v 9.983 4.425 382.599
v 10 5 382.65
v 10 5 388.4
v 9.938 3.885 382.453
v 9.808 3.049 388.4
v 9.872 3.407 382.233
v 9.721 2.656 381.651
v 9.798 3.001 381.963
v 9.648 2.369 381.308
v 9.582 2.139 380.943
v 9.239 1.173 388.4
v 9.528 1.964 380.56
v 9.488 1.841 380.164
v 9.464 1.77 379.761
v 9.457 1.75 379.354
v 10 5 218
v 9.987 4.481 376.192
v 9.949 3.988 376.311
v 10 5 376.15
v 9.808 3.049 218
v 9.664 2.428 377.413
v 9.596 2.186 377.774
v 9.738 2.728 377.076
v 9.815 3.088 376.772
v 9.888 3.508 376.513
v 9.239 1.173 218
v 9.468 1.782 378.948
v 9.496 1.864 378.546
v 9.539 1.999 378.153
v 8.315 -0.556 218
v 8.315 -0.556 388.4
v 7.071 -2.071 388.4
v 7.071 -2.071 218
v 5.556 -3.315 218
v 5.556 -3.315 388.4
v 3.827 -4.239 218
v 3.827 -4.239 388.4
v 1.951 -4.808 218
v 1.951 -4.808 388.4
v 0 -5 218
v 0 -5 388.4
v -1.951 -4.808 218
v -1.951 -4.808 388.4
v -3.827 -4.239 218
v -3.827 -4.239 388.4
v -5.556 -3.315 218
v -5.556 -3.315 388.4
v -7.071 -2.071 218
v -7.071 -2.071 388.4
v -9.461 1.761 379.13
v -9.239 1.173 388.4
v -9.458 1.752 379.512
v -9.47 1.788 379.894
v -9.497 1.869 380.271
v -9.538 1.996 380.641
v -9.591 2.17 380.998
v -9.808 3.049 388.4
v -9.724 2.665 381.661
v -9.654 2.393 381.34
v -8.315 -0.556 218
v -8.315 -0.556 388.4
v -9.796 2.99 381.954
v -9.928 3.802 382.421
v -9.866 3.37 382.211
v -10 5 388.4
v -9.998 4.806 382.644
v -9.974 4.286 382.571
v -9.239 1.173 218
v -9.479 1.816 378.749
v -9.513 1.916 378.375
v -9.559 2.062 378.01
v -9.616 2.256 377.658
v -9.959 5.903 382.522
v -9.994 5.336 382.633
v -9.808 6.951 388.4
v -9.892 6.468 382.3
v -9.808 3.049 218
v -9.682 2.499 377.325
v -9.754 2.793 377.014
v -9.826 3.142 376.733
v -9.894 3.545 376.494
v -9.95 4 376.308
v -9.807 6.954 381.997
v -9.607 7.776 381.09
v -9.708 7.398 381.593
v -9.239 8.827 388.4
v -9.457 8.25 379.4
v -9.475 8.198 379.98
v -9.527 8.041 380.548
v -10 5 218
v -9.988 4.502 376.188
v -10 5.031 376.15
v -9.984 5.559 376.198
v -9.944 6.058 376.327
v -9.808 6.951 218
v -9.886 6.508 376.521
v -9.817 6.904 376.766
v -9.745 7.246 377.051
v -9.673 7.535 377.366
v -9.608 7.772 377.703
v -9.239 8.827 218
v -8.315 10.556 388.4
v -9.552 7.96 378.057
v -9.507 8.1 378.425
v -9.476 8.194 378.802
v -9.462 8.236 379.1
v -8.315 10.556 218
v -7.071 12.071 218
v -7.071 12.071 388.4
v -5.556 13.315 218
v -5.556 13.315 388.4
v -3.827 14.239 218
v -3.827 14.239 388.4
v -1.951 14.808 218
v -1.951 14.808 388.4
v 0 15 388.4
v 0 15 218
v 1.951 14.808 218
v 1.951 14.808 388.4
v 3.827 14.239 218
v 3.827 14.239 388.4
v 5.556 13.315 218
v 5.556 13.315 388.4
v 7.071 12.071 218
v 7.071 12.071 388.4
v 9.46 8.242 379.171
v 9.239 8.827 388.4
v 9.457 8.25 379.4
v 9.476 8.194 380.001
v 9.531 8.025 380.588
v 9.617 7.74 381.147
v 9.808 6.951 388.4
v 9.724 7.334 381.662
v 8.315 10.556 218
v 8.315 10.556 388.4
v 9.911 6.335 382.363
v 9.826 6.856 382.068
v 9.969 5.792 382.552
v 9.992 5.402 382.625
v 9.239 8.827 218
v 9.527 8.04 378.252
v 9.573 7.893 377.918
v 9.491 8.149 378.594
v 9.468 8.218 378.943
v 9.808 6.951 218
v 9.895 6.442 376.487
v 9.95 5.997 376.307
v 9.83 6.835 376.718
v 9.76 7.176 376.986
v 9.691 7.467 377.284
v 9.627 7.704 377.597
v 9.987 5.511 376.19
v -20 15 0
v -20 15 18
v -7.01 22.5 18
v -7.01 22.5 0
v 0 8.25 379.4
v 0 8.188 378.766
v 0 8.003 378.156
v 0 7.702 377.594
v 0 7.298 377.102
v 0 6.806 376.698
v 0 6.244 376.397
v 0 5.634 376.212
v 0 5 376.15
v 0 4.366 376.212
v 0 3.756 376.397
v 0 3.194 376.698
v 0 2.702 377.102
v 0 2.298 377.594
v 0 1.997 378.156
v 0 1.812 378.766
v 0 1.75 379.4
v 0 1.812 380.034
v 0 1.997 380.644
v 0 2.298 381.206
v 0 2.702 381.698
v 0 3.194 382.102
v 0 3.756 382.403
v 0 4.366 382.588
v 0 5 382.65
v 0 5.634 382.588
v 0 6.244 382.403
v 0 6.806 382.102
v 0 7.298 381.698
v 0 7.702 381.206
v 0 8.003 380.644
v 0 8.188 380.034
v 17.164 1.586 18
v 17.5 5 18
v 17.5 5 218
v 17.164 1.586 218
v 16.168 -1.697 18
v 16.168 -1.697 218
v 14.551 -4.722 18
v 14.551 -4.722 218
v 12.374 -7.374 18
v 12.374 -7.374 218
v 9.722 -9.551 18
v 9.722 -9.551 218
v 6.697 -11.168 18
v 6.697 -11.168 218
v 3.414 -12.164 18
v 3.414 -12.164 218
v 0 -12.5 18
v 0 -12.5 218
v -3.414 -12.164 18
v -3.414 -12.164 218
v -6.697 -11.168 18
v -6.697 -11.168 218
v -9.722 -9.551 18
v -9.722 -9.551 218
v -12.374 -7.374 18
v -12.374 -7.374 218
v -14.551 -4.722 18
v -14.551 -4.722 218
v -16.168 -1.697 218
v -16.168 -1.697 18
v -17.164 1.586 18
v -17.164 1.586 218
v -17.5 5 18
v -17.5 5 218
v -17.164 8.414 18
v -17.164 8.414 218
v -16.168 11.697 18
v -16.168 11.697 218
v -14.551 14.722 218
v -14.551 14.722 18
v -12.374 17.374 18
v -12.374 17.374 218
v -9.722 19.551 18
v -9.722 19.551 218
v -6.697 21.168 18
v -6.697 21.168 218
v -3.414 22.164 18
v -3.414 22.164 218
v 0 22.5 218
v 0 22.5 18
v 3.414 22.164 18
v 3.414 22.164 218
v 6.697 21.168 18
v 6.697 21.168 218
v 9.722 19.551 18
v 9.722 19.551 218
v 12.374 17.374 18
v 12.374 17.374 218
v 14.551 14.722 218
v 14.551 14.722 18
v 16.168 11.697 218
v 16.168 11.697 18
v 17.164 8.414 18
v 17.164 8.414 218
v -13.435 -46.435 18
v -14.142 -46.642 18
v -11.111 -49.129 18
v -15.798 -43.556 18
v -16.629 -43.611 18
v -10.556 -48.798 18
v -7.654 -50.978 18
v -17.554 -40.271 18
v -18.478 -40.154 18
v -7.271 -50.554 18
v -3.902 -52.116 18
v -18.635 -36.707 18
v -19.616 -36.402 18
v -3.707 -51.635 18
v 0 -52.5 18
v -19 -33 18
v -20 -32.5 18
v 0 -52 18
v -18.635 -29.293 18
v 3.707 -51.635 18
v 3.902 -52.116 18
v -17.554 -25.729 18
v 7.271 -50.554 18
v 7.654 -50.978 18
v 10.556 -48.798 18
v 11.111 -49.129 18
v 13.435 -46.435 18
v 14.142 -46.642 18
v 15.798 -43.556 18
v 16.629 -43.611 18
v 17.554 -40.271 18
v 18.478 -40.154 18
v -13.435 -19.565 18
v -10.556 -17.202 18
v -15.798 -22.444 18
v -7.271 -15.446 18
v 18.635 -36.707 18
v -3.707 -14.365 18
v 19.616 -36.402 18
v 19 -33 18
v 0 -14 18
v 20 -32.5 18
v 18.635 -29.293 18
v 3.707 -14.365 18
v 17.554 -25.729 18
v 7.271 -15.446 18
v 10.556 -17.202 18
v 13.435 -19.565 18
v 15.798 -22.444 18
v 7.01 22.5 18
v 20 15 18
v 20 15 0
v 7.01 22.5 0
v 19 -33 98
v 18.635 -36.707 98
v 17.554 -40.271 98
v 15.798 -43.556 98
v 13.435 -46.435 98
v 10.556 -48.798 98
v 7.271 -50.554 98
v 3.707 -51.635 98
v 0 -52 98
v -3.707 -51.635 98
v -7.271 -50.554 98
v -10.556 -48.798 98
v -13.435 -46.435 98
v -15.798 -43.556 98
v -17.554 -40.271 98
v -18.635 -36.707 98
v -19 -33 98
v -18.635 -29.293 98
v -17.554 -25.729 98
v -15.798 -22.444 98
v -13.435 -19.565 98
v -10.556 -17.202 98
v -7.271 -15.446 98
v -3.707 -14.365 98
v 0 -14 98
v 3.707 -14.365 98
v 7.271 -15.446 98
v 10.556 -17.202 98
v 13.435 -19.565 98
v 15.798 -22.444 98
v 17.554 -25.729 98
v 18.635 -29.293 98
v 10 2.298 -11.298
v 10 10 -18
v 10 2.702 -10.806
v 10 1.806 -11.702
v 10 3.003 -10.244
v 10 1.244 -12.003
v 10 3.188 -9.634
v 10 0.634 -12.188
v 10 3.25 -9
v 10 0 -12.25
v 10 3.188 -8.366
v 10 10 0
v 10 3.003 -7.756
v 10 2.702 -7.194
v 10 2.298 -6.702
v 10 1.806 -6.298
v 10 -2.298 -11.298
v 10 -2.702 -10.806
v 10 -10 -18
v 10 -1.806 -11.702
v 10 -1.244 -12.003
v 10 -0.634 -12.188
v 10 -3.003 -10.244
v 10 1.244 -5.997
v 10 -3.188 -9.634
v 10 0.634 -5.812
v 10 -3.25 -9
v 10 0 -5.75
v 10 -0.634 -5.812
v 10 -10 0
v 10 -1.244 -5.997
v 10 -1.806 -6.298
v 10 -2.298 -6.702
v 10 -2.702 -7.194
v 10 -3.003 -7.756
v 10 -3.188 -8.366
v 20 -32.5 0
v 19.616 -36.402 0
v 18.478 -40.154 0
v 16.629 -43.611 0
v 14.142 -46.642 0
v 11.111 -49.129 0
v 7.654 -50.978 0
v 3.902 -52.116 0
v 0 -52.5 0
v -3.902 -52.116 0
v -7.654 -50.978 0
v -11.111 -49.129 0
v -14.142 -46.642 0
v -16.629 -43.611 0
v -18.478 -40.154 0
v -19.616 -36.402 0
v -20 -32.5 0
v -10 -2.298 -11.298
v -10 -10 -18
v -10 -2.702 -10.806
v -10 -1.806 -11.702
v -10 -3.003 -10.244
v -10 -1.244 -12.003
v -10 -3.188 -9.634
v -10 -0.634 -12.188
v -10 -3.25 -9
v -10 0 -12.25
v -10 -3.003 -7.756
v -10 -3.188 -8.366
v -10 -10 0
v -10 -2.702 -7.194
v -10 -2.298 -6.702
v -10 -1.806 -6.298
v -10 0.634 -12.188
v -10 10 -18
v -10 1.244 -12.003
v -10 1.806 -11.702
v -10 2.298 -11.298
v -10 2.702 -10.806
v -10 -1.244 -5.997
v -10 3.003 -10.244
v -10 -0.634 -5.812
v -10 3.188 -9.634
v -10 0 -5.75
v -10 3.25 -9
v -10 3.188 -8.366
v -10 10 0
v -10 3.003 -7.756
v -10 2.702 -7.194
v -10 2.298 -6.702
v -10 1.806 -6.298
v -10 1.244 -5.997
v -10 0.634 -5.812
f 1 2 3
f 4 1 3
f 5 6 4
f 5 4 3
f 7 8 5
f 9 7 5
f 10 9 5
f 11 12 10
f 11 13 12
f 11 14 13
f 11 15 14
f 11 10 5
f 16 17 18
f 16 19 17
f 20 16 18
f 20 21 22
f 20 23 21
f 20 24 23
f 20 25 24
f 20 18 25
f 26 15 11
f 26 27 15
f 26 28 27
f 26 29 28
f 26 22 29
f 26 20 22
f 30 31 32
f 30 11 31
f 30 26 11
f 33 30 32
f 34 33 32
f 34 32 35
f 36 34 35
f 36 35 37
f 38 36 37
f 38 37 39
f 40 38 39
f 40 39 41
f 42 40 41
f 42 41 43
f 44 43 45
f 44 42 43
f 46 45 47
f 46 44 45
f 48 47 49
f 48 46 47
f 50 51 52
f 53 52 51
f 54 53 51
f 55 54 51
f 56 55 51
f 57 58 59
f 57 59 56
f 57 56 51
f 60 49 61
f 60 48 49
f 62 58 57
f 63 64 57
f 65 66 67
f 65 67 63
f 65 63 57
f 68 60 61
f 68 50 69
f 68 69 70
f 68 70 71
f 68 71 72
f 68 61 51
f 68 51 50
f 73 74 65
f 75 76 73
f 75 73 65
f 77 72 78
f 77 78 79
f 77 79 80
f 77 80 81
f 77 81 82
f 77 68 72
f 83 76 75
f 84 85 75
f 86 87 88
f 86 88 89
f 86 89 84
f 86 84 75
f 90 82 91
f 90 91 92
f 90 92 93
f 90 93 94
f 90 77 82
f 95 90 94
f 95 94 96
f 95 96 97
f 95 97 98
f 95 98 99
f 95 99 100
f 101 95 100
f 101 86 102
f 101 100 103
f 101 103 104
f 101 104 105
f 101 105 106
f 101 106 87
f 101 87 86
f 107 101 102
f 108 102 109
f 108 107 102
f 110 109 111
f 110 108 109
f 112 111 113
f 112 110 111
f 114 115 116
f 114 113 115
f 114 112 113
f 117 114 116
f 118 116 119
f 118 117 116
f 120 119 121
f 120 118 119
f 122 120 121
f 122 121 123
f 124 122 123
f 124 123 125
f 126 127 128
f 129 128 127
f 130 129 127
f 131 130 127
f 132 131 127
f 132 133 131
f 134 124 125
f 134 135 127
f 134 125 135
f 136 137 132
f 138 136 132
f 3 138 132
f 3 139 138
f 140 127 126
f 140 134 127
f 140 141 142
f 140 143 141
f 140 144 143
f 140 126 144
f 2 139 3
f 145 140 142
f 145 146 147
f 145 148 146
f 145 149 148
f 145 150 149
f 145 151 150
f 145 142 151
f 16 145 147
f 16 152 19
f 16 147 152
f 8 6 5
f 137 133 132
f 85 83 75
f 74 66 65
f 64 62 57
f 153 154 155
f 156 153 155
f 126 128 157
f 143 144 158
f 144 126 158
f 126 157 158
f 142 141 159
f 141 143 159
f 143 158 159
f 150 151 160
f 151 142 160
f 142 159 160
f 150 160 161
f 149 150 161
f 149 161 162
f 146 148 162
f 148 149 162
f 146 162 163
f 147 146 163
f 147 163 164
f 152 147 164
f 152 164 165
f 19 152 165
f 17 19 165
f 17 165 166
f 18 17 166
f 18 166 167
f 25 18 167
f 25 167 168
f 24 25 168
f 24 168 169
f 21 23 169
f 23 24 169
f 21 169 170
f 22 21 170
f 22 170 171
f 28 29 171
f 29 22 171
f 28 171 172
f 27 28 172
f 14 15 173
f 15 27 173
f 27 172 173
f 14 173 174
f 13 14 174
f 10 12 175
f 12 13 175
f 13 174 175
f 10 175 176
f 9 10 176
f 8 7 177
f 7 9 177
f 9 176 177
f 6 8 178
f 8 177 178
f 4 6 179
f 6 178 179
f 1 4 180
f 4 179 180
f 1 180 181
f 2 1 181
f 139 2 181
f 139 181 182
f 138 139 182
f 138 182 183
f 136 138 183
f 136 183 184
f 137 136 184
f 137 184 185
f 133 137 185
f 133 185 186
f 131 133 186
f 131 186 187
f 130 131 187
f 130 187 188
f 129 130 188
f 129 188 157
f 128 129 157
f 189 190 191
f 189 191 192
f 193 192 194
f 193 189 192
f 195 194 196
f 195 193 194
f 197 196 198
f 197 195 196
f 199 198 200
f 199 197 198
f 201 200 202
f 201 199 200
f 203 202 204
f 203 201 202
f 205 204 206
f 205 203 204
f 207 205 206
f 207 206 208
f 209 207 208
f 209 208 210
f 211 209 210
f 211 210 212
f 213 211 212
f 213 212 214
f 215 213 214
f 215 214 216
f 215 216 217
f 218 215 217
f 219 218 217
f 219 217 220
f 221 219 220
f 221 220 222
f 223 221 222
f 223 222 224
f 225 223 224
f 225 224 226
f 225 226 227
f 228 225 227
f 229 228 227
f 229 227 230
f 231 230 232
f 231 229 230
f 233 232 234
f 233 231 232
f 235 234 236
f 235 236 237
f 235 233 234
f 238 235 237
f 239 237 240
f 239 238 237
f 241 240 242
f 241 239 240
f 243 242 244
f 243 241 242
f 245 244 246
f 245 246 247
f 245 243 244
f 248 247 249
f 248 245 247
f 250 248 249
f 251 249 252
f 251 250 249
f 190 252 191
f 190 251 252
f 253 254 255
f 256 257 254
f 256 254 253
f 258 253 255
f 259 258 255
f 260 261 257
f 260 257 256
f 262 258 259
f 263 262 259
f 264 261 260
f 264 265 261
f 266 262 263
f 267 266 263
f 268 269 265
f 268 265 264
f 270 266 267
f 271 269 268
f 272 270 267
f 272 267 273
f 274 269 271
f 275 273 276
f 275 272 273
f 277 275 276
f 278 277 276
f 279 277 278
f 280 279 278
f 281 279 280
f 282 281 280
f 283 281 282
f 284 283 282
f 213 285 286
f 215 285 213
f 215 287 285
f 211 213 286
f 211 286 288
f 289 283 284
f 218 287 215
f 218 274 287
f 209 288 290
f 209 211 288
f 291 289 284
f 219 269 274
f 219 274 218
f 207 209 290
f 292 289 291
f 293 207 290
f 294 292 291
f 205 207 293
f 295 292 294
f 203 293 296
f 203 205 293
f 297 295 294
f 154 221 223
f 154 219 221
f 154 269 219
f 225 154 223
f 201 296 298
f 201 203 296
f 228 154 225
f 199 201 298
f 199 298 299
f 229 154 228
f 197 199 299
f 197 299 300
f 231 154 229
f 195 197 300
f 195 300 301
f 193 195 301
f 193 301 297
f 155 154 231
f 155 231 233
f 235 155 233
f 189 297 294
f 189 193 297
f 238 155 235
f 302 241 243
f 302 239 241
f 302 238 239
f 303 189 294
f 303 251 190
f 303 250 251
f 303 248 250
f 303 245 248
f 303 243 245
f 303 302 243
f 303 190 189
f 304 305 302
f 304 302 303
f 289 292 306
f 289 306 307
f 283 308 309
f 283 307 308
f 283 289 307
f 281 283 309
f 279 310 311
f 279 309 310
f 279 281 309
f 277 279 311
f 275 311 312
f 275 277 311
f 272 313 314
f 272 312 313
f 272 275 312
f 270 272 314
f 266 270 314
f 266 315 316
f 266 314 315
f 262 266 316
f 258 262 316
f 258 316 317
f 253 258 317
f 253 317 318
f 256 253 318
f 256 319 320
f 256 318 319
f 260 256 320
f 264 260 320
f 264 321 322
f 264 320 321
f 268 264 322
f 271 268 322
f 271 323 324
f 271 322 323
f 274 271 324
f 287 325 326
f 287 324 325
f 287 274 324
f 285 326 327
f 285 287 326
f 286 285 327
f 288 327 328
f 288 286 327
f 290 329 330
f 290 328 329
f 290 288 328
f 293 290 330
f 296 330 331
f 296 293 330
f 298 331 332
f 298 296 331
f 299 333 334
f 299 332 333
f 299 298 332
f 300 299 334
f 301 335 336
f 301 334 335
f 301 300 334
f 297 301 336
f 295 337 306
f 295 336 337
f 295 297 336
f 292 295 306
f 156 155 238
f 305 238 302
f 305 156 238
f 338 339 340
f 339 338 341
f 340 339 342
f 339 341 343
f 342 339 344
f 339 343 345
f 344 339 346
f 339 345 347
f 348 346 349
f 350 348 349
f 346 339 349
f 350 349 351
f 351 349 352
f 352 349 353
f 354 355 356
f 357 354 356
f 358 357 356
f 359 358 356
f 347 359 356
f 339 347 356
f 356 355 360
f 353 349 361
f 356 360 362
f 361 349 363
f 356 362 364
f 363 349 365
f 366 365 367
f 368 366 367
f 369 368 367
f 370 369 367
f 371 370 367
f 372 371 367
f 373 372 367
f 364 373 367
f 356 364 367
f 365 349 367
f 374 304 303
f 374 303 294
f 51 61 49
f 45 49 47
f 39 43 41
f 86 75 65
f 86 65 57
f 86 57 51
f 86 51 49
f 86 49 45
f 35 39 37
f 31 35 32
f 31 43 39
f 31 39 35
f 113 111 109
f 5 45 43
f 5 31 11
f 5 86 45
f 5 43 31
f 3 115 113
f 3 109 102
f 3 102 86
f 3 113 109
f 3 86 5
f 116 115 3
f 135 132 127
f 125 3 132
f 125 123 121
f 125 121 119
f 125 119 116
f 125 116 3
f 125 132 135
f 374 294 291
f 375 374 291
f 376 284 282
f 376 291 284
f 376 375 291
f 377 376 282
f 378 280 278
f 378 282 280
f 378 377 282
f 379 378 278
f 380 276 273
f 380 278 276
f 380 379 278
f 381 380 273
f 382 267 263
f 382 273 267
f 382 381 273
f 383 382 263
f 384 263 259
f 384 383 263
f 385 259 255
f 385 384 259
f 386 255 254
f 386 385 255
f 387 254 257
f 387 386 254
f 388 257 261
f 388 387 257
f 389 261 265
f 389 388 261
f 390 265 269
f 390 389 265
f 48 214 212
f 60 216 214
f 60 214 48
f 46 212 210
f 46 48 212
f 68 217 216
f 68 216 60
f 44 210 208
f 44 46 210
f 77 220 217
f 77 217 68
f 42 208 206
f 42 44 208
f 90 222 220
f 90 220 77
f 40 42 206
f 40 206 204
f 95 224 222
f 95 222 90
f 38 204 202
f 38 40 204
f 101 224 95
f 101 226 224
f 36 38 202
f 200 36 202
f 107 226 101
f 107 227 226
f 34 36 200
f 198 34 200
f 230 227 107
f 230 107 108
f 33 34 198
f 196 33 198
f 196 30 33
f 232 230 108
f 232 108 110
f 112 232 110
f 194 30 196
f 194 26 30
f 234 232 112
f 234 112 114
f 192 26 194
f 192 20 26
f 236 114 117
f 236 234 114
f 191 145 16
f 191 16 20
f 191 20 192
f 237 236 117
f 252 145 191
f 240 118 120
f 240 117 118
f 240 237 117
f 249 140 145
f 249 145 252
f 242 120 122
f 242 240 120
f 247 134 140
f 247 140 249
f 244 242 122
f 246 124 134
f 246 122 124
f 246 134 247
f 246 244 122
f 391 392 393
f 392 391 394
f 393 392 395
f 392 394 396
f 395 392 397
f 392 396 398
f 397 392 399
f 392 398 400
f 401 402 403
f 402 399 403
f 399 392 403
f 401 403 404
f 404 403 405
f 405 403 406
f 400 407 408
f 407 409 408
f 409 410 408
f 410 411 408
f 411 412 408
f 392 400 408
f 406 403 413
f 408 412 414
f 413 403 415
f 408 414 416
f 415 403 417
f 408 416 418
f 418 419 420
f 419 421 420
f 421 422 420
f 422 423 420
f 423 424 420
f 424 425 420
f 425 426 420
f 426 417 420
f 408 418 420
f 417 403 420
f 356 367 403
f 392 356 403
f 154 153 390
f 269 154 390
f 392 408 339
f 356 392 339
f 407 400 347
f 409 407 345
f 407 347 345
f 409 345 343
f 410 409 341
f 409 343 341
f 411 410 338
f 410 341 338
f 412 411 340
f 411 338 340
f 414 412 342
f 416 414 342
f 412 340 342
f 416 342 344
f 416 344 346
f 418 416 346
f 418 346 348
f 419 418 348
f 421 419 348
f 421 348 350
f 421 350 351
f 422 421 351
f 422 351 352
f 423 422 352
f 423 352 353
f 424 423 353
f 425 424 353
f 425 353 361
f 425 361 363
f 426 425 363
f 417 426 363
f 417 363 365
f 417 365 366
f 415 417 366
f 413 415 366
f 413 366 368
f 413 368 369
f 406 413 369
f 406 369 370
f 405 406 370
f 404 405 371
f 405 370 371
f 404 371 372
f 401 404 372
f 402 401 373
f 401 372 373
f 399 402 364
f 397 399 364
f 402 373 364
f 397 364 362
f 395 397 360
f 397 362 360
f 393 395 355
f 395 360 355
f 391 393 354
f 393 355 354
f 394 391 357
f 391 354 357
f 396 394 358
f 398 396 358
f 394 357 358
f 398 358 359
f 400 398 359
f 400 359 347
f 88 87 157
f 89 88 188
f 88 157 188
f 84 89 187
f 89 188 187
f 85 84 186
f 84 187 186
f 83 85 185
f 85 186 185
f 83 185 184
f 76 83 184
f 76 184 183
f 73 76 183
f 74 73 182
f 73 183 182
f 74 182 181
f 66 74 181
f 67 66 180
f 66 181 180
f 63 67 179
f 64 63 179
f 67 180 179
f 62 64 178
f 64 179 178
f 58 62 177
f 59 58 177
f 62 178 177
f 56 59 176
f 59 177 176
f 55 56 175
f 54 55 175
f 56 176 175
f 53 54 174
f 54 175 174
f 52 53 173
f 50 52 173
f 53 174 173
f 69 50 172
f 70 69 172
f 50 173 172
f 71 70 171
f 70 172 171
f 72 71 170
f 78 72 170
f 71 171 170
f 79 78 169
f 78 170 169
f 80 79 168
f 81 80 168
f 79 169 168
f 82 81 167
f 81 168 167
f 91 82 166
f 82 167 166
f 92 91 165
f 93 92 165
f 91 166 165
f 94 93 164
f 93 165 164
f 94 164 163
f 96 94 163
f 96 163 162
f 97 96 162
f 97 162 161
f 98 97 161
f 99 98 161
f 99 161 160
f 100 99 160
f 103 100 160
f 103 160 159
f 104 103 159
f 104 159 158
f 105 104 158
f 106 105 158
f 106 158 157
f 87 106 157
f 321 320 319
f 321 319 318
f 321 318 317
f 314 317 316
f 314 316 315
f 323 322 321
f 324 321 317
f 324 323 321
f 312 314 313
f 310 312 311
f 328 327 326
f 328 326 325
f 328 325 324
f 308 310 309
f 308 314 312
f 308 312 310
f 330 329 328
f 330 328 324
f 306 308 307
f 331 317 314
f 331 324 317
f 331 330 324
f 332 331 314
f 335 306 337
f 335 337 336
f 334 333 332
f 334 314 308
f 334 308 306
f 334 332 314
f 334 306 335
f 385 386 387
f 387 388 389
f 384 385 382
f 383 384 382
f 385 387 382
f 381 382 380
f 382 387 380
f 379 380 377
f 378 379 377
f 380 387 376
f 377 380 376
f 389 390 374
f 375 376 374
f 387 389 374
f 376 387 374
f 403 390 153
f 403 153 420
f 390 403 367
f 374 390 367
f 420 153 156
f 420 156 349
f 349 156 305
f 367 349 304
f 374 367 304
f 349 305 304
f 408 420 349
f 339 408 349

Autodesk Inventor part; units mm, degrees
ref_plane "YZ Plane" through (0, 0, 0) normal (1, 0, 0) x (0, 1, 0)
ref_plane "XZ Plane" through (0, 0, 0) normal (0, 1, 0) x (-1, 0, 0)
ref_plane "XY Plane" through (0, 0, 0) normal (0, 0, 1) x (1, 0, 0)
sketch "Sketch1" plane through (0, 0, 0) normal (0, 0, 1) x (1, 0, 0)
  line L0 (-10, -10) -> (10, -10)
  line L1 (10, -10) -> (10, 10)
  line L2 (10, 10) -> (-10, 10)
  line L3 (-10, 10) -> (-10, -10)
  line L4 (-10, -10) -> (10, 10) construction
  line L5 (10, -10) -> (-10, 10) construction
  line L6 (-20, 15) -> (-20, -32.5)
  line L7 (-20, 15) -> (-7.0096, 22.5)
  line L8 (-20, 15) -> (-5, 15) construction
  line L9 (-7.0096, 22.5) -> (7.0096, 22.5)
  line L10 (7.0096, 22.5) -> (20, 15)
  line L11 (20, 15) -> (20, -32.5)
  circle A0 centre (0, -32.5) radius 20 construction
  arc A1 (-20, -32.5) -> (20, -32.5) centre (0, -32.5) ccw
  point P0 (0, 0)
  point P1 (0, 22.5)
  point P2 (0, 10)
  dimension "d0" = 20
  dimension "d1" = 20
  dimension "d3" = 15
  dimension "d4" = 30
  dimension "d5" = 15
  dimension "d6" = 150
  dimension "d8" = 40
  dimension "d9" = 5
  dimension "d10" = 40
  dimension "d11" = 55
extrude "Extrusion1" add sketch "Sketch1" along normal blind 18
sketch "Sketch2" plane through (0, 0, 18) normal (0, 0, 1) x (1, 0, 0)
  line L0 (-10, -10) -> (-10, 10) projected
  line L1 (-10, 10) -> (10, 10) projected
  line L2 (10, 10) -> (10, -10) projected
  line L3 (10, -10) -> (-10, -10) projected
  line L4 (-20, 15) -> (-20, -32.5) projected
  arc A0 (-20, -32.5) -> (20, -32.5) centre (0, -32.5) ccw projected
  line L5 (20, -32.5) -> (20, 15) projected
  line L6 (20, 15) -> (7.0096, 22.5) projected
  line L7 (7.0096, 22.5) -> (-7.0096, 22.5) projected
  line L8 (-7.0096, 22.5) -> (-20, 15) projected
  point P0 (0, 0)
extrude "Extrusion2" add sketch "Sketch2" against normal blind 36 contours L0 L1 L2 L3
sketch "Sketch3" plane through (10, -10, 0) normal (1, 0, 0) x (0, 0, -1)
  circle A0 centre (9, 10) radius 3.25
  line L0 (0, 20) -> (18, 20) projected
  line L1 (0, 0) -> (0, 20) projected
  point P0 (0, 10)
  point P1 (9, 20)
  point P2 (0, 10)
  dimension "d16" = 6.5
extrude "Extrusion3" cut sketch "Sketch3" against normal through all
sketch "Sketch4" plane through (0, 0, 18) normal (0, 0, 1) x (1, 0, 0)
  circle A0 centre (0, 5) radius 17.5
  line L0 (7.0096, 22.5) -> (-7.0096, 22.5) projected
  point P0 (0, 0)
  point P1 (0, 22.5)
  dimension "d19" = 35
extrude "Extrusion4" add sketch "Sketch4" along normal blind 200
sketch "Sketch5" plane through (0, 0, 18) normal (0, 0, 1) x (1, 0, 0)
  circle A0 centre (0, -33) radius 19
  circle A1 centre (0, 5) radius 17.5 projected
  point P0 (0, 0)
  dimension "d22" = 38
  dimension "d23" = 38
extrude "Extrusion5" add sketch "Sketch5" along normal blind 80 contours A0
sketch "Sketch10" plane through (0, 5, 218) normal (0, 0, 1) x (1, 0, 0)
  circle A0 centre (0, 0) radius 10
  circle A1 centre (0, 0) radius 17.5 projected
  point P0 (0, -5)
  dimension "d32" = 20
extrude "Extrusion8" add sketch "Sketch10" along normal blind 152.4 contours A0
sketch "Sketch6" plane through (0, 5, 370.4) normal (0, 0, 1) x (1, 0, 0)
  circle A0 centre (0, 0) radius 17.5
  circle A1 centre (0, 0) radius 10
  point P0 (0, -5)
  dimension "d26" = 20
extrude "Extrusion6" add sketch "Sketch6" along normal blind 18 contours A1
sketch "Sketch8" plane through (0, 0, 0) normal (1, 0, 0) x (0, 1, 0)
  line L0 (15, 388.4) -> (-5, 388.4) projected
  line L1 (-5, 218) -> (15, 218) projected
  circle A0 centre (5, 379.4) radius 3.25
  line L2 (15, 388.4) -> (-5, 388.4) projected
  line L3 (15, 388.4) -> (15, 370.4)
  point P0 (0, 0)
  point P1 (5, 218)
  point P2 (15, 379.4)
  dimension "d29" = 6.5
  dimension "d35" = 18
extrude "Extrusion7" cut sketch "Sketch8" along normal through all both and the other way through all
properties part number "LinearActuator450" material "Steel, Carbon"
